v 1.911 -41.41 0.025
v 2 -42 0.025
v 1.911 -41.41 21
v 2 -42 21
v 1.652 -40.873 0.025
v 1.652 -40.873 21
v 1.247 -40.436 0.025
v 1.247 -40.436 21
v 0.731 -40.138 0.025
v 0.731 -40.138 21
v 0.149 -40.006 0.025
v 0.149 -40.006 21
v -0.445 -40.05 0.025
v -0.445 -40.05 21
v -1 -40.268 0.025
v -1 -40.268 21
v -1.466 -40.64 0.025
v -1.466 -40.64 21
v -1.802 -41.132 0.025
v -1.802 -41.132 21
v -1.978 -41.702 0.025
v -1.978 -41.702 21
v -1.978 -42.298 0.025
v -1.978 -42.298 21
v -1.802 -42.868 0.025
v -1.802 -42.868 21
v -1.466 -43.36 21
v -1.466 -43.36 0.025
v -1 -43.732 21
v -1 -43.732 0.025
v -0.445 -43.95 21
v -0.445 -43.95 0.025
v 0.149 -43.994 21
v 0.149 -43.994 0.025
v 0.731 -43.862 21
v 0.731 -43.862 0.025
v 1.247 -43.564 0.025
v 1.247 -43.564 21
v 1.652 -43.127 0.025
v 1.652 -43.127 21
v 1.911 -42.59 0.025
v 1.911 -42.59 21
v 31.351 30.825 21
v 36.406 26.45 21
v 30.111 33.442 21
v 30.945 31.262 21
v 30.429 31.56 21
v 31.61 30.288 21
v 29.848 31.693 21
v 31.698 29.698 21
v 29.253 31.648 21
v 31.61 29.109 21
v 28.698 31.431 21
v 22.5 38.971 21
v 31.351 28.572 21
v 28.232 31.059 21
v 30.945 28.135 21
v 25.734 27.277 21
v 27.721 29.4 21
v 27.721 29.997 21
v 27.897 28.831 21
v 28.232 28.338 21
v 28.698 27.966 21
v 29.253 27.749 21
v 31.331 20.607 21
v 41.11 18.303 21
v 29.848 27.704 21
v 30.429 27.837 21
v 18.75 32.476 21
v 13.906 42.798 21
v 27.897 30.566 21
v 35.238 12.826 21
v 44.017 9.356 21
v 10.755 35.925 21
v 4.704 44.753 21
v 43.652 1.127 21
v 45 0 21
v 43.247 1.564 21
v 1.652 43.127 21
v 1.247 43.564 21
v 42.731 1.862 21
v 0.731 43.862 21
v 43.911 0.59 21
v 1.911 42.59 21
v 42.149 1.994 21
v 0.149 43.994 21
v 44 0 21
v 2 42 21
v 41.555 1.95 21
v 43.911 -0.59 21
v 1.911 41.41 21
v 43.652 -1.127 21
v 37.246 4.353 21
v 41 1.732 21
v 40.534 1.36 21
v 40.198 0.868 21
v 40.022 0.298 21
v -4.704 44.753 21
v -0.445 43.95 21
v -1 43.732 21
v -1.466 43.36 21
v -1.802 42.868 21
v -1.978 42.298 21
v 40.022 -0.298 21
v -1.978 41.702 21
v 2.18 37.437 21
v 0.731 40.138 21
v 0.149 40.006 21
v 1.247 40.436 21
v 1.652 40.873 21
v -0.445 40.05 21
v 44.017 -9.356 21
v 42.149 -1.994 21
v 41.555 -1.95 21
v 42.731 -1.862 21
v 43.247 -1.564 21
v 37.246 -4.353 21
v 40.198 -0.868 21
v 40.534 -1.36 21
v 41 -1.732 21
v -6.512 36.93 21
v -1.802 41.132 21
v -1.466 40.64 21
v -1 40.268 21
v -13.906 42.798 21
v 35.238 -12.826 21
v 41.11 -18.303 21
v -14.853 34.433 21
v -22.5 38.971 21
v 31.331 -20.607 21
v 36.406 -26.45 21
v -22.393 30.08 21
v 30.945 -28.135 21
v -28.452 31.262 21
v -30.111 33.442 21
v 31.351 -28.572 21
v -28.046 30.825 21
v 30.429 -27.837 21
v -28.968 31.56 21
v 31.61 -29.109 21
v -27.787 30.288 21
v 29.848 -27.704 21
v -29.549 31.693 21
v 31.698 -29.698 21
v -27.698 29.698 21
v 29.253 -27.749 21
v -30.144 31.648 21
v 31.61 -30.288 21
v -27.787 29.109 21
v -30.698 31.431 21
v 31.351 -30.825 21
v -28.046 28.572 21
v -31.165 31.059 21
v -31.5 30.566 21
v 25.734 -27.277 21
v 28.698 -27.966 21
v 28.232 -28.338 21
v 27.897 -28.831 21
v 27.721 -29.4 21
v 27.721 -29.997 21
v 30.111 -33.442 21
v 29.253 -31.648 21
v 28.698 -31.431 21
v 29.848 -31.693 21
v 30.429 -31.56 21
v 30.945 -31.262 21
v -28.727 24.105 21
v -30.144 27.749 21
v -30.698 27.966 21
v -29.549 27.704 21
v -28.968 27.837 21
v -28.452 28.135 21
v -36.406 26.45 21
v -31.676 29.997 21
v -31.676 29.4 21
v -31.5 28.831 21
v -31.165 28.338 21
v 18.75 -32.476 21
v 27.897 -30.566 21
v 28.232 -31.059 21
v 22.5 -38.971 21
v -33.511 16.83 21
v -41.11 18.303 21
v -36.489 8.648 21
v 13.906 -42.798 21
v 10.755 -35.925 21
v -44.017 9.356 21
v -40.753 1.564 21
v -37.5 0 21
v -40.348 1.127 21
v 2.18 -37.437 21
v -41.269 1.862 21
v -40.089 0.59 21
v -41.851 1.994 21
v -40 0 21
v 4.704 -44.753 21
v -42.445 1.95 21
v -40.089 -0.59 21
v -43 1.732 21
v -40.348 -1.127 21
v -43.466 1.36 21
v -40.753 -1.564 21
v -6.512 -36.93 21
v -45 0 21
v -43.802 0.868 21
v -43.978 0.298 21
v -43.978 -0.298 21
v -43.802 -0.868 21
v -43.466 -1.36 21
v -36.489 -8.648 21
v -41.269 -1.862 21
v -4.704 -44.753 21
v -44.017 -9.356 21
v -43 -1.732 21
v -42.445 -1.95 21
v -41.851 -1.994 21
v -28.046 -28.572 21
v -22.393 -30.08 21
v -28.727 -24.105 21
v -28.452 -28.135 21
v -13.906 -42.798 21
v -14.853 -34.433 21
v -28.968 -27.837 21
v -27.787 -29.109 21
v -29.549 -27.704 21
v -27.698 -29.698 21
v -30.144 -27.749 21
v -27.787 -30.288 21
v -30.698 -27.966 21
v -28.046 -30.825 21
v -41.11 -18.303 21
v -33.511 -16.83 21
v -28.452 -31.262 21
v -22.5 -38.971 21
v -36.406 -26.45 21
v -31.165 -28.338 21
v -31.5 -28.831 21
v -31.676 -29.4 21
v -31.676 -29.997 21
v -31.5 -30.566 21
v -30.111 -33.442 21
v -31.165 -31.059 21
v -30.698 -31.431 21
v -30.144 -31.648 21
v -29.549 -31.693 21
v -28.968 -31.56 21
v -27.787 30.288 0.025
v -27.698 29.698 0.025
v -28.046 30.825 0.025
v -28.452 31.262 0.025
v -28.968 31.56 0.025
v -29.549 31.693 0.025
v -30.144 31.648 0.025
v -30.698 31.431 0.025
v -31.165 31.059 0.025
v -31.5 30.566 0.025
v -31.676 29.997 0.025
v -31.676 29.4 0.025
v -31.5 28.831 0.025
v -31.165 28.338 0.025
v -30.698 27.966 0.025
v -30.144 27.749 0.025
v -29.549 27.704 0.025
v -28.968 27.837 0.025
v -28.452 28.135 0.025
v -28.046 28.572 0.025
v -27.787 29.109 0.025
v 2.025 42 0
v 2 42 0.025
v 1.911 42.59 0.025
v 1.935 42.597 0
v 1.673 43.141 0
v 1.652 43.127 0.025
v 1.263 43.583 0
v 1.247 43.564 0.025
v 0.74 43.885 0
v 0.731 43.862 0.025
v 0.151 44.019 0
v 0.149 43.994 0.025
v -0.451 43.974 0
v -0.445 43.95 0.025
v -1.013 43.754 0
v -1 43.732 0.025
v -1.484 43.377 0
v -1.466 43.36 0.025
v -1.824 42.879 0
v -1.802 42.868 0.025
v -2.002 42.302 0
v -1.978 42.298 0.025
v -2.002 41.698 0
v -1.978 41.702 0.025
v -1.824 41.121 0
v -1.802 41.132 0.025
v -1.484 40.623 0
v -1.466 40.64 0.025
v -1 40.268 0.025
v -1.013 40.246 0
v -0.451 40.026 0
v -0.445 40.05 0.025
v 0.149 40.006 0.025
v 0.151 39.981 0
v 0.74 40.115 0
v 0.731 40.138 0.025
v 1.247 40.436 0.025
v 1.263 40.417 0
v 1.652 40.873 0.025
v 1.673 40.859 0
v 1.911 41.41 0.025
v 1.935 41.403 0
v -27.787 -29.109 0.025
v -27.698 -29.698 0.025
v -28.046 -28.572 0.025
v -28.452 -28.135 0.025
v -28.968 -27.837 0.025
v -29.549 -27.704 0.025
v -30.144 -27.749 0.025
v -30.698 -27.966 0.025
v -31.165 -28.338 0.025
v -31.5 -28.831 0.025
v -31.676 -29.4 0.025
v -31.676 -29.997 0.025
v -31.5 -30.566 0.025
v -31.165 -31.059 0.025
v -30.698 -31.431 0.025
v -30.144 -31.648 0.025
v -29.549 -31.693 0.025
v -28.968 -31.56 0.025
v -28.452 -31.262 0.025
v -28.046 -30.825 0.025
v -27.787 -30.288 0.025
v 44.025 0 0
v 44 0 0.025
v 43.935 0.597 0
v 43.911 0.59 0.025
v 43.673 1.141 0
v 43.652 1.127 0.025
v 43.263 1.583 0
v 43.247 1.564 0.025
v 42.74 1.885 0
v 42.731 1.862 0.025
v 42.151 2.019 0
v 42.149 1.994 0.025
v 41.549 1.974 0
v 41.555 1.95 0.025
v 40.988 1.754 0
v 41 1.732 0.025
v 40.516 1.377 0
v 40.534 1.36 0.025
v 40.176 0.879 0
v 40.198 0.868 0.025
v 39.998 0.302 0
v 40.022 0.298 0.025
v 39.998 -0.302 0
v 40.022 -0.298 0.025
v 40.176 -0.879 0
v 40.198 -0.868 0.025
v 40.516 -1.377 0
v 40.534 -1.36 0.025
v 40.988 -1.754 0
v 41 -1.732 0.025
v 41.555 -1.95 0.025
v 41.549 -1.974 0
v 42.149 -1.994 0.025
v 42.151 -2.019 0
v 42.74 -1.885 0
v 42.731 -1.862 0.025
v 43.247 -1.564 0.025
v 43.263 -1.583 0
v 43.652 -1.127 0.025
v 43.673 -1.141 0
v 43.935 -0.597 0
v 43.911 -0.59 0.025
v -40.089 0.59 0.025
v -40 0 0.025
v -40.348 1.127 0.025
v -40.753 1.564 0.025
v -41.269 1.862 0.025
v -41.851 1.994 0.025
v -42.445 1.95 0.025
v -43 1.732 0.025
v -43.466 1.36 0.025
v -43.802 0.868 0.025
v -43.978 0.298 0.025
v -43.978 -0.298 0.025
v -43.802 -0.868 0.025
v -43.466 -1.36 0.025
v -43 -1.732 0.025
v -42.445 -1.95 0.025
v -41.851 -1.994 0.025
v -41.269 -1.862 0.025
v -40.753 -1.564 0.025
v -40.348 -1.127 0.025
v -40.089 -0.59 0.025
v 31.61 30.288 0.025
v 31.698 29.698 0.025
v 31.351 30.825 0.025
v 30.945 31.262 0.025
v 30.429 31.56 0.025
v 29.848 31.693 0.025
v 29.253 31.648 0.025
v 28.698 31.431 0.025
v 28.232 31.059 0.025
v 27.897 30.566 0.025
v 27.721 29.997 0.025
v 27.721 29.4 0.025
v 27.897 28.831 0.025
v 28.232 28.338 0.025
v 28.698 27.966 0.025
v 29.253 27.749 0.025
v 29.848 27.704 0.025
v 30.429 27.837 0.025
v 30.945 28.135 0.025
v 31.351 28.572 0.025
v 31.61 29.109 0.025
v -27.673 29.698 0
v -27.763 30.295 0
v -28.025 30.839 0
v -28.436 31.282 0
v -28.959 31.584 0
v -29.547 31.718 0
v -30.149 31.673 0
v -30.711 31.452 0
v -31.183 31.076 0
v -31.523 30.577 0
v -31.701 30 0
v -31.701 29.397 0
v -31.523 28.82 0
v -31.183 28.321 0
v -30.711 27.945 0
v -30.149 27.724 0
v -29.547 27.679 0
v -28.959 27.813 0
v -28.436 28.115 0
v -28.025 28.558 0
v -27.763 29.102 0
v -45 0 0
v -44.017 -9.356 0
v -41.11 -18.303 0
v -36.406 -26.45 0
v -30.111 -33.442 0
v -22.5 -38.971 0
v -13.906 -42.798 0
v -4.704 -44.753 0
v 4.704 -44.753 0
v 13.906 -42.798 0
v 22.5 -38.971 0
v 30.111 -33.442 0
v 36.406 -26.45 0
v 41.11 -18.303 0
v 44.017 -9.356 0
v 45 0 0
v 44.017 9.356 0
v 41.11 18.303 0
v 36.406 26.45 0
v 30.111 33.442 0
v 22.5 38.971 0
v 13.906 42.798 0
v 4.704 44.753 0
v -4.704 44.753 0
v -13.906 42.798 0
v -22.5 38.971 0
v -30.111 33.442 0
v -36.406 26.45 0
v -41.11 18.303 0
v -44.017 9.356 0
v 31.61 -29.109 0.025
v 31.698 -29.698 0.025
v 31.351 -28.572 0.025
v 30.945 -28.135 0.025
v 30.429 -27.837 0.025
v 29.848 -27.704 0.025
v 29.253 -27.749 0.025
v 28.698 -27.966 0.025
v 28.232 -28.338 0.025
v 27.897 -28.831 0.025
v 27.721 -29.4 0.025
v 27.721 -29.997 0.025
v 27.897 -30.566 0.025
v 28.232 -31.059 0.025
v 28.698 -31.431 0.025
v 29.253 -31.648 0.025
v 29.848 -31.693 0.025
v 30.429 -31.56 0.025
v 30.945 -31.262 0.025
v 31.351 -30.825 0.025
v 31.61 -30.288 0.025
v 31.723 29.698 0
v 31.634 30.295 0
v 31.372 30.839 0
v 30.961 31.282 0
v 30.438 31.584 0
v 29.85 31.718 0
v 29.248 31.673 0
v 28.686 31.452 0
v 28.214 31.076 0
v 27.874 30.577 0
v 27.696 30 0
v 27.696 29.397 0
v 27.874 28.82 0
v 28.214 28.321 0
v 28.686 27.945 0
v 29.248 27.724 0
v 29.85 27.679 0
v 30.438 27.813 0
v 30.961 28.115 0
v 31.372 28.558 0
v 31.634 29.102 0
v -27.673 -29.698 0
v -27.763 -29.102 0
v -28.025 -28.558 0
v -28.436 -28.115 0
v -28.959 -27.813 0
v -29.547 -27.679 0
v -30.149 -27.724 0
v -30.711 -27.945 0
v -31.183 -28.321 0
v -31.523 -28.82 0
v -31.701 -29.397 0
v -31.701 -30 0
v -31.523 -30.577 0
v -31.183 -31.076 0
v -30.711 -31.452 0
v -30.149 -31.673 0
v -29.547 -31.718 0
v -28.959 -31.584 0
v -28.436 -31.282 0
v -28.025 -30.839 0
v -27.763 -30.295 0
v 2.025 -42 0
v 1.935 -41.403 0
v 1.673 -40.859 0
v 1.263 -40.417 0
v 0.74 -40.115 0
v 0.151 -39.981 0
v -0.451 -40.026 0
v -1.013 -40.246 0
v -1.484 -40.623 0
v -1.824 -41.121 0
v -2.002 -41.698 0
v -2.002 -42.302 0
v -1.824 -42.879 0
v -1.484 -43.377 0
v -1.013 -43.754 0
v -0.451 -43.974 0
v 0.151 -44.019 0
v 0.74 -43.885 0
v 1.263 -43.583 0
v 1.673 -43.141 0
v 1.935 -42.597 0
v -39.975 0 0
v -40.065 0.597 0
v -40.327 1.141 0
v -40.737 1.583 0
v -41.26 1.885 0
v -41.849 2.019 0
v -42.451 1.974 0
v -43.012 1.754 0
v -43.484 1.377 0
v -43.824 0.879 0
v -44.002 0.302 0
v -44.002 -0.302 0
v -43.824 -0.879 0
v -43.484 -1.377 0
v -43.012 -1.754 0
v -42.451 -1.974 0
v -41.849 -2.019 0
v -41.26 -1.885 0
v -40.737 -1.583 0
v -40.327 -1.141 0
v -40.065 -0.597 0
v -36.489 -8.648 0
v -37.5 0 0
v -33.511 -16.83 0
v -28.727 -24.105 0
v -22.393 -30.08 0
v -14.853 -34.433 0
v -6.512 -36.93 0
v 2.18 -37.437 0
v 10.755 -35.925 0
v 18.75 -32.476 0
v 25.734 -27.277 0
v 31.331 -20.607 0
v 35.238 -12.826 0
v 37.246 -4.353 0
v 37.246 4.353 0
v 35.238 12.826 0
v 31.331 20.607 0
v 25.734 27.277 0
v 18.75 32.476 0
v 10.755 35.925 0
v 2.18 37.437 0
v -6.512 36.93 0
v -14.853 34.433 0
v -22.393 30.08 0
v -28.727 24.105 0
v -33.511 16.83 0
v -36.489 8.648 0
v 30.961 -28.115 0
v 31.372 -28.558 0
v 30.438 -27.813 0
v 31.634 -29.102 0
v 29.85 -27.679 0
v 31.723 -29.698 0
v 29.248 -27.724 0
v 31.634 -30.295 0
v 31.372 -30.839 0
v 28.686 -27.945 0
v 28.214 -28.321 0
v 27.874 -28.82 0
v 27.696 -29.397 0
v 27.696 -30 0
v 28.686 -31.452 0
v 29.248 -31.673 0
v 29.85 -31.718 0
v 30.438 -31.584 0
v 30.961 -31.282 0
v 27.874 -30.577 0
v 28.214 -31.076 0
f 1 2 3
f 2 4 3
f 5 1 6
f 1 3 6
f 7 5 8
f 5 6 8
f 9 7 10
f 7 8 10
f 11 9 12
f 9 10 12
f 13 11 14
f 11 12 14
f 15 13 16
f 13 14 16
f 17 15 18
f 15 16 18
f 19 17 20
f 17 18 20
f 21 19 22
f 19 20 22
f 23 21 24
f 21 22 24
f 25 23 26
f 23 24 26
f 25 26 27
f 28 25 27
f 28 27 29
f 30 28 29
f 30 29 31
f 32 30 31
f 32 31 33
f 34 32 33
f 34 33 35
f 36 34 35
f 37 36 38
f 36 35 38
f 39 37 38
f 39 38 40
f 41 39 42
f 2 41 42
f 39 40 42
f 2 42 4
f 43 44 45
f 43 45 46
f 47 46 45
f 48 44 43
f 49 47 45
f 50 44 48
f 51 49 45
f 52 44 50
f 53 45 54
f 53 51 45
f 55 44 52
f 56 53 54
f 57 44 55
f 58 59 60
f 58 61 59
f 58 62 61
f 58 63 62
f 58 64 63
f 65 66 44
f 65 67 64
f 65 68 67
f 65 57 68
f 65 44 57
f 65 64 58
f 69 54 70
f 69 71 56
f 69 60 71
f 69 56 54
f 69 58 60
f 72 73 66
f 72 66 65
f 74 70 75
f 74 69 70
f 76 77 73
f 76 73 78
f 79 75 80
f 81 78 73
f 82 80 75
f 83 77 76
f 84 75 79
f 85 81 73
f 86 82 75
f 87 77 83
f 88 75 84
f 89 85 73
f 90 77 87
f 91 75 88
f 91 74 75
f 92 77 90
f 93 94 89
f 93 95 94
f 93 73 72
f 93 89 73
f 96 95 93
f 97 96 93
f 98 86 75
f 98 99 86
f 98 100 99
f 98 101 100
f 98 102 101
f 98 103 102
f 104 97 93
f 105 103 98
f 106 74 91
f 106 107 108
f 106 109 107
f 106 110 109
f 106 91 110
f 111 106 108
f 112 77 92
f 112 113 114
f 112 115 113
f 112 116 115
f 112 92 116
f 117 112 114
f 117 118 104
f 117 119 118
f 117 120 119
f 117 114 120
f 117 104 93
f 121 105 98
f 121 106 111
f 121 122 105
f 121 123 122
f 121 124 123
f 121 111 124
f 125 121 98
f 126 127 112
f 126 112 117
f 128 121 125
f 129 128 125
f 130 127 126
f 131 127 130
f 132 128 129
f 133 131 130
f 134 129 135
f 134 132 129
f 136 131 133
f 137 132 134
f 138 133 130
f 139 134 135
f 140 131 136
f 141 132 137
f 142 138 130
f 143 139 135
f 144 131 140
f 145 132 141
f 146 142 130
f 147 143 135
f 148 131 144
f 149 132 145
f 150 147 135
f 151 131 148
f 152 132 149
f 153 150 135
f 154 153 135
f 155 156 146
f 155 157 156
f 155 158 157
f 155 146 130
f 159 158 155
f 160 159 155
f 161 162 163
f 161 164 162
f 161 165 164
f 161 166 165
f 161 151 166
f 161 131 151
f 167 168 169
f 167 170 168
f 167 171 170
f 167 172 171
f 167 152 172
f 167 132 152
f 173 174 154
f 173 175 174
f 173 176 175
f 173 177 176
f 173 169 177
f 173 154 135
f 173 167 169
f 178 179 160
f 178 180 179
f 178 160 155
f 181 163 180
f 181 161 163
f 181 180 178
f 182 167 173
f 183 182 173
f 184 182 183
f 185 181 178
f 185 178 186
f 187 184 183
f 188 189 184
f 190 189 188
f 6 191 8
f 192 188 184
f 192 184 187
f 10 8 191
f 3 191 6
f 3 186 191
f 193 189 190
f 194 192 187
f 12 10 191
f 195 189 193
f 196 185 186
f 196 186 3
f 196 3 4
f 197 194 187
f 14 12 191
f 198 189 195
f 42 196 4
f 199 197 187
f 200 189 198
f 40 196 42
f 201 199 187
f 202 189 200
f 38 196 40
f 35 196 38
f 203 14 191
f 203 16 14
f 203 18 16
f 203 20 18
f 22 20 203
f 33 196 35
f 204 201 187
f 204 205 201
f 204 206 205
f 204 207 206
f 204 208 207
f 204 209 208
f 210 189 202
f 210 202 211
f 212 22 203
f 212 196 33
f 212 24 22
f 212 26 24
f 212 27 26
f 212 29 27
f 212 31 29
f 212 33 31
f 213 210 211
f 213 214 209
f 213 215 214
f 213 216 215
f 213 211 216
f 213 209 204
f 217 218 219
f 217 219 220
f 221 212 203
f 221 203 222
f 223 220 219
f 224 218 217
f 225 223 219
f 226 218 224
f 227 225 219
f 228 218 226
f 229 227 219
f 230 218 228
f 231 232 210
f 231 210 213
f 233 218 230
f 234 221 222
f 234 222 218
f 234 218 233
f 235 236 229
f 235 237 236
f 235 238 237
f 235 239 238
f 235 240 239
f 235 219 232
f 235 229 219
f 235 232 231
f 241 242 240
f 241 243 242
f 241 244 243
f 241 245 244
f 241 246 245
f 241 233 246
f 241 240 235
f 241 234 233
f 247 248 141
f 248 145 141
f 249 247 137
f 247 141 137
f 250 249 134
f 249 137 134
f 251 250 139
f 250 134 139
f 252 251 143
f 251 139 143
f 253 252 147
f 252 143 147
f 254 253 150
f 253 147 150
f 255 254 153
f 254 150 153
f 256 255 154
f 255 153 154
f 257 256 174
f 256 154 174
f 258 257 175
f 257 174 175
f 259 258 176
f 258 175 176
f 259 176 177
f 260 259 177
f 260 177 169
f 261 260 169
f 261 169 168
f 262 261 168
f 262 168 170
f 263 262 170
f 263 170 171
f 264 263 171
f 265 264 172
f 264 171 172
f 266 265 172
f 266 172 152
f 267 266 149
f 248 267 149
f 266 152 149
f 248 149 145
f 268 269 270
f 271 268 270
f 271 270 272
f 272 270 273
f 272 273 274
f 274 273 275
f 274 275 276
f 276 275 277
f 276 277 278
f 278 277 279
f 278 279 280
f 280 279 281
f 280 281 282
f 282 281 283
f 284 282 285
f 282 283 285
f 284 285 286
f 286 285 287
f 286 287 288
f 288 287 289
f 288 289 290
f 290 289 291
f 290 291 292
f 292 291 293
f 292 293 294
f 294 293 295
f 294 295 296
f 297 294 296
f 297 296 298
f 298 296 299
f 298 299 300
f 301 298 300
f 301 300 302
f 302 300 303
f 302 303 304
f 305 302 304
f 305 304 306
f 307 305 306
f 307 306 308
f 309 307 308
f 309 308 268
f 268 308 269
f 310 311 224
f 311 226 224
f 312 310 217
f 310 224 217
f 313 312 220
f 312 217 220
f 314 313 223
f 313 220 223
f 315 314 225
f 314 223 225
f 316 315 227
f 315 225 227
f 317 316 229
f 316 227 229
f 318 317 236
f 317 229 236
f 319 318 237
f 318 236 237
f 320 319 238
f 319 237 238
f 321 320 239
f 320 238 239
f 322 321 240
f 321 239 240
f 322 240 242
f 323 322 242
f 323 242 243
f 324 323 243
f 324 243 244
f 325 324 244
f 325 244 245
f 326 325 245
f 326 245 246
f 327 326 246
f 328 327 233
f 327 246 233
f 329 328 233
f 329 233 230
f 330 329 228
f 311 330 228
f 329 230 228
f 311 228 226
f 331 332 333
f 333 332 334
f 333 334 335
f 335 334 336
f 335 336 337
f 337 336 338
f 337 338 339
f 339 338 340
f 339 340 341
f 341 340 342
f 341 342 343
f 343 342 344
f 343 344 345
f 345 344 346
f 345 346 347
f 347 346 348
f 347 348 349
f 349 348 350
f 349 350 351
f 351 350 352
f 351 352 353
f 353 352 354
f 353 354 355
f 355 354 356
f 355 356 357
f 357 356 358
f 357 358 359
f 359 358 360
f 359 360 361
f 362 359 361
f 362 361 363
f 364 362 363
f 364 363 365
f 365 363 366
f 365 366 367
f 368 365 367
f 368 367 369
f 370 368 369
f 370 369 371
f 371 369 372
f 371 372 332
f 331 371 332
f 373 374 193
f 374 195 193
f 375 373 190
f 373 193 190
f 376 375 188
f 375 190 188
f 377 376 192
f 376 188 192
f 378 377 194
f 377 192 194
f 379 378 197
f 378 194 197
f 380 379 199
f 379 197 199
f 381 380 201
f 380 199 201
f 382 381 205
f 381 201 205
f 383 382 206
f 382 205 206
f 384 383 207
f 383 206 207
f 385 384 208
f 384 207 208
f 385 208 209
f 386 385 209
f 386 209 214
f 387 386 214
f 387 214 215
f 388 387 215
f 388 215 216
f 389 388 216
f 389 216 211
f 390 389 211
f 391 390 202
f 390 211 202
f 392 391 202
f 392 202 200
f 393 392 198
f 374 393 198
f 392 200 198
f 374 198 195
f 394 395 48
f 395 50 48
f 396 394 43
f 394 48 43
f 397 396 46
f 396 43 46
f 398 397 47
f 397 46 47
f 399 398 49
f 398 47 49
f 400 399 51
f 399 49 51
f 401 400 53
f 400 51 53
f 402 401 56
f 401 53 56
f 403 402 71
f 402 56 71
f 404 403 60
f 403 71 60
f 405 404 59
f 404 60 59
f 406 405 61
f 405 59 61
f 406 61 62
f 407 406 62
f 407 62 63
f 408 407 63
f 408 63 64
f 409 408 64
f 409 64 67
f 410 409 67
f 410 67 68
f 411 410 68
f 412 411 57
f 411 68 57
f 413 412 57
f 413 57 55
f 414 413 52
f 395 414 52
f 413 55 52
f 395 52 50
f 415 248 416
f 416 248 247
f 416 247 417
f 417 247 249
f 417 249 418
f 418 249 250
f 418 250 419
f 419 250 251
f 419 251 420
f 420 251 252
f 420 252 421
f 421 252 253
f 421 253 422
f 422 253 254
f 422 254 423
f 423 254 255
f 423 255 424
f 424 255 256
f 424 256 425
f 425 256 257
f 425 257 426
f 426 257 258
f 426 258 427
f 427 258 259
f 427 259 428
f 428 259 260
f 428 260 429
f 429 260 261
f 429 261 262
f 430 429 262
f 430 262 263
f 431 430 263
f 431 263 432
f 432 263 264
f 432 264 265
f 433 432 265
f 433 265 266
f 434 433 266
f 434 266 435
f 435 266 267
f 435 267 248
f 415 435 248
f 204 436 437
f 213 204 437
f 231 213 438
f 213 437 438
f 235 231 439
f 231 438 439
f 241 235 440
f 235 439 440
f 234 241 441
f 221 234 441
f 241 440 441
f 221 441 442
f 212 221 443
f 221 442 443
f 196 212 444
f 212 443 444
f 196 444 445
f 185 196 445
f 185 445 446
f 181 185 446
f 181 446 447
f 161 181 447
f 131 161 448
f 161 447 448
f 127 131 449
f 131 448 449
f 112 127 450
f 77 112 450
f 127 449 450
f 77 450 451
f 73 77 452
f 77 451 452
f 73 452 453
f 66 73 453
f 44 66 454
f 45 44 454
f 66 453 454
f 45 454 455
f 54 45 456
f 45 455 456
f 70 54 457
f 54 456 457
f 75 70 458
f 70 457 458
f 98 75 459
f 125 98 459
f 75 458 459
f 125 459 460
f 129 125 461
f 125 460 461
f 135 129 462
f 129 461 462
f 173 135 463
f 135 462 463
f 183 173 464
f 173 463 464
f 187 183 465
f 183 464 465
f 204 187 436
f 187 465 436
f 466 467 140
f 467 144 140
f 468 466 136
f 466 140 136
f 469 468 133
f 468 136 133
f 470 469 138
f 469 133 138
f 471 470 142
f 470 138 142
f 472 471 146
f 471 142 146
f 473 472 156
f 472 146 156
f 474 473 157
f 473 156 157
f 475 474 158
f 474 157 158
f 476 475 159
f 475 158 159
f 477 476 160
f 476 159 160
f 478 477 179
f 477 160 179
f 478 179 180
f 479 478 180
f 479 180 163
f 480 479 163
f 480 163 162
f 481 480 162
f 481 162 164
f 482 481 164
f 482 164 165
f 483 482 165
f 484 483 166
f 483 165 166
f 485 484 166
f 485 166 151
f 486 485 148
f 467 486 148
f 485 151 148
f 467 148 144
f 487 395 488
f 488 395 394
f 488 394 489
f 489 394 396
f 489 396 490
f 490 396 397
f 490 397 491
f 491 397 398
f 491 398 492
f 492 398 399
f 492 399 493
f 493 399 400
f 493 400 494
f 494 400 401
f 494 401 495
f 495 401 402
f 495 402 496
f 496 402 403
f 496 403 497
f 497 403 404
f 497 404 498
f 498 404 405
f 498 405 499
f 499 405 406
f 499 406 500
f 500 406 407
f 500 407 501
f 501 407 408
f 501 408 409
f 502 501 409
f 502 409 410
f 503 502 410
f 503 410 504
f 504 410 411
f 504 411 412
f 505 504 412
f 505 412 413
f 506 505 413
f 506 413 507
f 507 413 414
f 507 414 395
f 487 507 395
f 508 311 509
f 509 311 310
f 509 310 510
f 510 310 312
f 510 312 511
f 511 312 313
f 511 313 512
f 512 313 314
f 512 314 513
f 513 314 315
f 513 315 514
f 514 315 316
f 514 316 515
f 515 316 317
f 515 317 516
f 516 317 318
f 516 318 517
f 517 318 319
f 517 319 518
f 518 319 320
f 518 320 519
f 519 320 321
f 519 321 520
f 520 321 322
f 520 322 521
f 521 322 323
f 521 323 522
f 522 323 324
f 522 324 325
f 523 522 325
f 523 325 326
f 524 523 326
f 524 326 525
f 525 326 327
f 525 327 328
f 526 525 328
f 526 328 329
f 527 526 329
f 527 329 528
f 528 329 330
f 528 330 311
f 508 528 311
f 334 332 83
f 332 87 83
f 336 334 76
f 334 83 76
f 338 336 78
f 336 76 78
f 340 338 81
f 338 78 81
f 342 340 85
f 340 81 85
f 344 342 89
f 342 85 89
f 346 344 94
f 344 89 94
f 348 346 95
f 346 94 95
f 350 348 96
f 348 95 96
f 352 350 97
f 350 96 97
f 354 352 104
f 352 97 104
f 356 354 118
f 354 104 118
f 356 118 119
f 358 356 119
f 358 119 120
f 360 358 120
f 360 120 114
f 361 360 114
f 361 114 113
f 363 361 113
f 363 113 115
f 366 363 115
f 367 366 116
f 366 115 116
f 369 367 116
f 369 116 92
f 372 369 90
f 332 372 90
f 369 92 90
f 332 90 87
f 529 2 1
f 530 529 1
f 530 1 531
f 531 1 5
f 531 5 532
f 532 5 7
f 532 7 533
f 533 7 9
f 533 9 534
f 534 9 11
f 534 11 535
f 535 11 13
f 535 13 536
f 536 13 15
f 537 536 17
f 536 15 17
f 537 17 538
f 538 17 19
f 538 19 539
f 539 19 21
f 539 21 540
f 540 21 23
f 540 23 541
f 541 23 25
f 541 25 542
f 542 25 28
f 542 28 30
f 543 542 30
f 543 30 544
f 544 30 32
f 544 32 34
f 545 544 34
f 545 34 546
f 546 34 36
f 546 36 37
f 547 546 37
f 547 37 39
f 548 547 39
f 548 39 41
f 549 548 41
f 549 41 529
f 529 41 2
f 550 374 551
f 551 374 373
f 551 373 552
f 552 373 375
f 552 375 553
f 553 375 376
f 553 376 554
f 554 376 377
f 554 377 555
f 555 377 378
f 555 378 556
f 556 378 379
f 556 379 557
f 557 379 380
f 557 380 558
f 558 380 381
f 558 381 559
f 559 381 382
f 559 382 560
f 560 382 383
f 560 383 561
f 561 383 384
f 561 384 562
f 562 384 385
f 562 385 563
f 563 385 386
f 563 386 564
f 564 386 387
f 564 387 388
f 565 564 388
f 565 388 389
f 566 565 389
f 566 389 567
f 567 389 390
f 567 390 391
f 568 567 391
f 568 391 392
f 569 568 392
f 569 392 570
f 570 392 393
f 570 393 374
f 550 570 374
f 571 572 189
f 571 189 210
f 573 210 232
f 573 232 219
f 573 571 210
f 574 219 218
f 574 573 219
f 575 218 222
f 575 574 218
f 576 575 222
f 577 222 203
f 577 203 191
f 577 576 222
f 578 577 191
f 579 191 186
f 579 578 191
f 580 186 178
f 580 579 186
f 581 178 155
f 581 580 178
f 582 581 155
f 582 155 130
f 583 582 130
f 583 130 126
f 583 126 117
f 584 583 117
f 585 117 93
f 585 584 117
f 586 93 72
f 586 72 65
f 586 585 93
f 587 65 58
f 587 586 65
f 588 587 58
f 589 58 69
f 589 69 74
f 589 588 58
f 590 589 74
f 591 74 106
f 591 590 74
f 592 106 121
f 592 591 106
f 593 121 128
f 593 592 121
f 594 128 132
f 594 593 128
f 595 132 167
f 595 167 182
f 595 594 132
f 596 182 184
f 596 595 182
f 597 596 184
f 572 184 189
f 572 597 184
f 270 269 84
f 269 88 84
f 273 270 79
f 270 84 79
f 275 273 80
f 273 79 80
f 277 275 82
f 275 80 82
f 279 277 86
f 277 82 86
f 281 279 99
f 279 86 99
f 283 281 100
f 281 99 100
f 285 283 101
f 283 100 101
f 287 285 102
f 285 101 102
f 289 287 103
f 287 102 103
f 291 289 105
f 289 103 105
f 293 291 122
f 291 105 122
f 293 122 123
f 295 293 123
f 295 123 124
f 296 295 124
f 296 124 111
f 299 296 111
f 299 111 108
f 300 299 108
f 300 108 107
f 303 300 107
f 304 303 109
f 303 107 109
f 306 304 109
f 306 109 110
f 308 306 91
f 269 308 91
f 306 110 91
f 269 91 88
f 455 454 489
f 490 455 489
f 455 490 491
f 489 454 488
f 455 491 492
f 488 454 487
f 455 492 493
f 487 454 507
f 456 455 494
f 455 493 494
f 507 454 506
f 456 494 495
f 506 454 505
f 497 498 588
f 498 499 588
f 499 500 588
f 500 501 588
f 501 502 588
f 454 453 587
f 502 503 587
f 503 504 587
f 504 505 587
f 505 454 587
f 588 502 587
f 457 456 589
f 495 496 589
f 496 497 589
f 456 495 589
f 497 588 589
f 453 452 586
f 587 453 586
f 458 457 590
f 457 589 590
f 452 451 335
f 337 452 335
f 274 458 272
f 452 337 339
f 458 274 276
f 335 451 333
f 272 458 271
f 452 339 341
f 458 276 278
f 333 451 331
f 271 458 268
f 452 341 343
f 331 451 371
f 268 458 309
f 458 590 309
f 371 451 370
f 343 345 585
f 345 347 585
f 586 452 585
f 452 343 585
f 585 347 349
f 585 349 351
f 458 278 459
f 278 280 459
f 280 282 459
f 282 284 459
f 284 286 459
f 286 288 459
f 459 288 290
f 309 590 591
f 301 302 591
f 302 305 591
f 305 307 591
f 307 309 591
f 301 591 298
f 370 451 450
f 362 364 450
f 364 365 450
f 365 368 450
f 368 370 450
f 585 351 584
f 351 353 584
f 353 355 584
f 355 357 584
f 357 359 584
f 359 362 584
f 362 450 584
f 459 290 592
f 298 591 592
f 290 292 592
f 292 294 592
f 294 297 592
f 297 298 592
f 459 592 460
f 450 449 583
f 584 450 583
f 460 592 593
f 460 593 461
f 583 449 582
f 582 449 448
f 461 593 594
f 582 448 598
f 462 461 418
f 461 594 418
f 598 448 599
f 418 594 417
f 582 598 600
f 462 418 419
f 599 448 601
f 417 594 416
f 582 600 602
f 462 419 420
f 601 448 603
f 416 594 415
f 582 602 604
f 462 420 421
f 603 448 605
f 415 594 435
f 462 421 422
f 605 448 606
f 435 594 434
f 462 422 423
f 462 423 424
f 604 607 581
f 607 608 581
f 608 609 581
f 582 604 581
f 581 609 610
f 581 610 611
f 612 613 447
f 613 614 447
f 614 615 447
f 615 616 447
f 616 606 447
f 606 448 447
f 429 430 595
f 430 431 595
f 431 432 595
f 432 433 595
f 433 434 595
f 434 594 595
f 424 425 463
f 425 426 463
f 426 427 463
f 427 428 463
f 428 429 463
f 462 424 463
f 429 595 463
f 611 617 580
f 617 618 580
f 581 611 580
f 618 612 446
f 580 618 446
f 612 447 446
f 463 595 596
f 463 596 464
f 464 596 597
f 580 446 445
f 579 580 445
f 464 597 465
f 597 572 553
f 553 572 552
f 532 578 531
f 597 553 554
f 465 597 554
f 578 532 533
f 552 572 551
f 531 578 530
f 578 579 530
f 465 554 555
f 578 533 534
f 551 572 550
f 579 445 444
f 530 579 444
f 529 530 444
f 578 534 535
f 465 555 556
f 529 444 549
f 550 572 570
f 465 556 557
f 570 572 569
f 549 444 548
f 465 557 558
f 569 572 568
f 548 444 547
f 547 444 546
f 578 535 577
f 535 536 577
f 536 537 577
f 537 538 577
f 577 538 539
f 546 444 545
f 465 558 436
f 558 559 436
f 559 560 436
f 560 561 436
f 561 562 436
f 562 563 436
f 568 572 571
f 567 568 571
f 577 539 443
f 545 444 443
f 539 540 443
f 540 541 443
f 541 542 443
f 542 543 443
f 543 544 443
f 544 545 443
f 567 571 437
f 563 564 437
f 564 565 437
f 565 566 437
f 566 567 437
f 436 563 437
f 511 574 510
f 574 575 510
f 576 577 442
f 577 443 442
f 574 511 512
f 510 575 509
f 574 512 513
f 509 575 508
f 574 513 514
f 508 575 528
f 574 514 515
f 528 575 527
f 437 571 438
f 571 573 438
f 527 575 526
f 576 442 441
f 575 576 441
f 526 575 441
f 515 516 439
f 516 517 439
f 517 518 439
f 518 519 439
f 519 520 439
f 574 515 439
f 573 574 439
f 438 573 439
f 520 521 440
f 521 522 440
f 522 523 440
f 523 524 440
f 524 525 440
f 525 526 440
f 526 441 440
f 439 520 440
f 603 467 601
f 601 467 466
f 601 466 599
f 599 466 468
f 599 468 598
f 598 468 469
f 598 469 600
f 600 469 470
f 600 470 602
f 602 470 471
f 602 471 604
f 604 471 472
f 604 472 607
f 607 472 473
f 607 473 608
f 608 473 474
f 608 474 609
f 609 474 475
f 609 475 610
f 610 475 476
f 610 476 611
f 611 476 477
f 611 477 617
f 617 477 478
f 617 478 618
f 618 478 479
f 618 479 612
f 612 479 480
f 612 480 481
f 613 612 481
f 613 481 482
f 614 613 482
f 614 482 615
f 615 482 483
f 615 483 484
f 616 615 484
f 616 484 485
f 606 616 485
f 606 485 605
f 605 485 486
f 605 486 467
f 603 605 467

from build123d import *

# Parameters (mm, degrees)
SKETCH1_R                       = 45
SKETCH1_R_2                     = 37.5
BOSS_EXTRUDE1_DEPTH             = 21
F_4_0MM_DOWEL_HOLE1_D           = 4
F_4_0MM_DOWEL_HOLE1_CSINK_D     = 4.05
F_4_0MM_DOWEL_HOLE1_CSINK_ANGLE = 90


with BuildPart() as part:
    # Sketch1 → Boss-Extrude1 (new body)
    with BuildSketch(Plane.XY):
        with Locations(Location((0, 0, 0), (0, 0, 180))):
            Circle(SKETCH1_R)
        with Locations(Location((0, 0, 0), (0, 0, 180))):
            Circle(SKETCH1_R_2, mode=Mode.SUBTRACT)
    extrude(amount=BOSS_EXTRUDE1_DEPTH)

    # Ø4.0mm Dowel Hole1 (through all)
    with Locations(Plane(origin=(0, 0, 0), x_dir=(-1, 0, 0), z_dir=(0, 0, -1))):
        with Locations((29.69848481, 29.69848481), (0, 42), (-29.69848481, 29.69848481), (-42, 0), (-29.69848481, -29.69848481), (0, -42), (29.69848481, -29.69848481), (42, 0)):
            CounterSinkHole(F_4_0MM_DOWEL_HOLE1_D / 2, F_4_0MM_DOWEL_HOLE1_CSINK_D / 2, counter_sink_angle=F_4_0MM_DOWEL_HOLE1_CSINK_ANGLE)


solid = part.part
